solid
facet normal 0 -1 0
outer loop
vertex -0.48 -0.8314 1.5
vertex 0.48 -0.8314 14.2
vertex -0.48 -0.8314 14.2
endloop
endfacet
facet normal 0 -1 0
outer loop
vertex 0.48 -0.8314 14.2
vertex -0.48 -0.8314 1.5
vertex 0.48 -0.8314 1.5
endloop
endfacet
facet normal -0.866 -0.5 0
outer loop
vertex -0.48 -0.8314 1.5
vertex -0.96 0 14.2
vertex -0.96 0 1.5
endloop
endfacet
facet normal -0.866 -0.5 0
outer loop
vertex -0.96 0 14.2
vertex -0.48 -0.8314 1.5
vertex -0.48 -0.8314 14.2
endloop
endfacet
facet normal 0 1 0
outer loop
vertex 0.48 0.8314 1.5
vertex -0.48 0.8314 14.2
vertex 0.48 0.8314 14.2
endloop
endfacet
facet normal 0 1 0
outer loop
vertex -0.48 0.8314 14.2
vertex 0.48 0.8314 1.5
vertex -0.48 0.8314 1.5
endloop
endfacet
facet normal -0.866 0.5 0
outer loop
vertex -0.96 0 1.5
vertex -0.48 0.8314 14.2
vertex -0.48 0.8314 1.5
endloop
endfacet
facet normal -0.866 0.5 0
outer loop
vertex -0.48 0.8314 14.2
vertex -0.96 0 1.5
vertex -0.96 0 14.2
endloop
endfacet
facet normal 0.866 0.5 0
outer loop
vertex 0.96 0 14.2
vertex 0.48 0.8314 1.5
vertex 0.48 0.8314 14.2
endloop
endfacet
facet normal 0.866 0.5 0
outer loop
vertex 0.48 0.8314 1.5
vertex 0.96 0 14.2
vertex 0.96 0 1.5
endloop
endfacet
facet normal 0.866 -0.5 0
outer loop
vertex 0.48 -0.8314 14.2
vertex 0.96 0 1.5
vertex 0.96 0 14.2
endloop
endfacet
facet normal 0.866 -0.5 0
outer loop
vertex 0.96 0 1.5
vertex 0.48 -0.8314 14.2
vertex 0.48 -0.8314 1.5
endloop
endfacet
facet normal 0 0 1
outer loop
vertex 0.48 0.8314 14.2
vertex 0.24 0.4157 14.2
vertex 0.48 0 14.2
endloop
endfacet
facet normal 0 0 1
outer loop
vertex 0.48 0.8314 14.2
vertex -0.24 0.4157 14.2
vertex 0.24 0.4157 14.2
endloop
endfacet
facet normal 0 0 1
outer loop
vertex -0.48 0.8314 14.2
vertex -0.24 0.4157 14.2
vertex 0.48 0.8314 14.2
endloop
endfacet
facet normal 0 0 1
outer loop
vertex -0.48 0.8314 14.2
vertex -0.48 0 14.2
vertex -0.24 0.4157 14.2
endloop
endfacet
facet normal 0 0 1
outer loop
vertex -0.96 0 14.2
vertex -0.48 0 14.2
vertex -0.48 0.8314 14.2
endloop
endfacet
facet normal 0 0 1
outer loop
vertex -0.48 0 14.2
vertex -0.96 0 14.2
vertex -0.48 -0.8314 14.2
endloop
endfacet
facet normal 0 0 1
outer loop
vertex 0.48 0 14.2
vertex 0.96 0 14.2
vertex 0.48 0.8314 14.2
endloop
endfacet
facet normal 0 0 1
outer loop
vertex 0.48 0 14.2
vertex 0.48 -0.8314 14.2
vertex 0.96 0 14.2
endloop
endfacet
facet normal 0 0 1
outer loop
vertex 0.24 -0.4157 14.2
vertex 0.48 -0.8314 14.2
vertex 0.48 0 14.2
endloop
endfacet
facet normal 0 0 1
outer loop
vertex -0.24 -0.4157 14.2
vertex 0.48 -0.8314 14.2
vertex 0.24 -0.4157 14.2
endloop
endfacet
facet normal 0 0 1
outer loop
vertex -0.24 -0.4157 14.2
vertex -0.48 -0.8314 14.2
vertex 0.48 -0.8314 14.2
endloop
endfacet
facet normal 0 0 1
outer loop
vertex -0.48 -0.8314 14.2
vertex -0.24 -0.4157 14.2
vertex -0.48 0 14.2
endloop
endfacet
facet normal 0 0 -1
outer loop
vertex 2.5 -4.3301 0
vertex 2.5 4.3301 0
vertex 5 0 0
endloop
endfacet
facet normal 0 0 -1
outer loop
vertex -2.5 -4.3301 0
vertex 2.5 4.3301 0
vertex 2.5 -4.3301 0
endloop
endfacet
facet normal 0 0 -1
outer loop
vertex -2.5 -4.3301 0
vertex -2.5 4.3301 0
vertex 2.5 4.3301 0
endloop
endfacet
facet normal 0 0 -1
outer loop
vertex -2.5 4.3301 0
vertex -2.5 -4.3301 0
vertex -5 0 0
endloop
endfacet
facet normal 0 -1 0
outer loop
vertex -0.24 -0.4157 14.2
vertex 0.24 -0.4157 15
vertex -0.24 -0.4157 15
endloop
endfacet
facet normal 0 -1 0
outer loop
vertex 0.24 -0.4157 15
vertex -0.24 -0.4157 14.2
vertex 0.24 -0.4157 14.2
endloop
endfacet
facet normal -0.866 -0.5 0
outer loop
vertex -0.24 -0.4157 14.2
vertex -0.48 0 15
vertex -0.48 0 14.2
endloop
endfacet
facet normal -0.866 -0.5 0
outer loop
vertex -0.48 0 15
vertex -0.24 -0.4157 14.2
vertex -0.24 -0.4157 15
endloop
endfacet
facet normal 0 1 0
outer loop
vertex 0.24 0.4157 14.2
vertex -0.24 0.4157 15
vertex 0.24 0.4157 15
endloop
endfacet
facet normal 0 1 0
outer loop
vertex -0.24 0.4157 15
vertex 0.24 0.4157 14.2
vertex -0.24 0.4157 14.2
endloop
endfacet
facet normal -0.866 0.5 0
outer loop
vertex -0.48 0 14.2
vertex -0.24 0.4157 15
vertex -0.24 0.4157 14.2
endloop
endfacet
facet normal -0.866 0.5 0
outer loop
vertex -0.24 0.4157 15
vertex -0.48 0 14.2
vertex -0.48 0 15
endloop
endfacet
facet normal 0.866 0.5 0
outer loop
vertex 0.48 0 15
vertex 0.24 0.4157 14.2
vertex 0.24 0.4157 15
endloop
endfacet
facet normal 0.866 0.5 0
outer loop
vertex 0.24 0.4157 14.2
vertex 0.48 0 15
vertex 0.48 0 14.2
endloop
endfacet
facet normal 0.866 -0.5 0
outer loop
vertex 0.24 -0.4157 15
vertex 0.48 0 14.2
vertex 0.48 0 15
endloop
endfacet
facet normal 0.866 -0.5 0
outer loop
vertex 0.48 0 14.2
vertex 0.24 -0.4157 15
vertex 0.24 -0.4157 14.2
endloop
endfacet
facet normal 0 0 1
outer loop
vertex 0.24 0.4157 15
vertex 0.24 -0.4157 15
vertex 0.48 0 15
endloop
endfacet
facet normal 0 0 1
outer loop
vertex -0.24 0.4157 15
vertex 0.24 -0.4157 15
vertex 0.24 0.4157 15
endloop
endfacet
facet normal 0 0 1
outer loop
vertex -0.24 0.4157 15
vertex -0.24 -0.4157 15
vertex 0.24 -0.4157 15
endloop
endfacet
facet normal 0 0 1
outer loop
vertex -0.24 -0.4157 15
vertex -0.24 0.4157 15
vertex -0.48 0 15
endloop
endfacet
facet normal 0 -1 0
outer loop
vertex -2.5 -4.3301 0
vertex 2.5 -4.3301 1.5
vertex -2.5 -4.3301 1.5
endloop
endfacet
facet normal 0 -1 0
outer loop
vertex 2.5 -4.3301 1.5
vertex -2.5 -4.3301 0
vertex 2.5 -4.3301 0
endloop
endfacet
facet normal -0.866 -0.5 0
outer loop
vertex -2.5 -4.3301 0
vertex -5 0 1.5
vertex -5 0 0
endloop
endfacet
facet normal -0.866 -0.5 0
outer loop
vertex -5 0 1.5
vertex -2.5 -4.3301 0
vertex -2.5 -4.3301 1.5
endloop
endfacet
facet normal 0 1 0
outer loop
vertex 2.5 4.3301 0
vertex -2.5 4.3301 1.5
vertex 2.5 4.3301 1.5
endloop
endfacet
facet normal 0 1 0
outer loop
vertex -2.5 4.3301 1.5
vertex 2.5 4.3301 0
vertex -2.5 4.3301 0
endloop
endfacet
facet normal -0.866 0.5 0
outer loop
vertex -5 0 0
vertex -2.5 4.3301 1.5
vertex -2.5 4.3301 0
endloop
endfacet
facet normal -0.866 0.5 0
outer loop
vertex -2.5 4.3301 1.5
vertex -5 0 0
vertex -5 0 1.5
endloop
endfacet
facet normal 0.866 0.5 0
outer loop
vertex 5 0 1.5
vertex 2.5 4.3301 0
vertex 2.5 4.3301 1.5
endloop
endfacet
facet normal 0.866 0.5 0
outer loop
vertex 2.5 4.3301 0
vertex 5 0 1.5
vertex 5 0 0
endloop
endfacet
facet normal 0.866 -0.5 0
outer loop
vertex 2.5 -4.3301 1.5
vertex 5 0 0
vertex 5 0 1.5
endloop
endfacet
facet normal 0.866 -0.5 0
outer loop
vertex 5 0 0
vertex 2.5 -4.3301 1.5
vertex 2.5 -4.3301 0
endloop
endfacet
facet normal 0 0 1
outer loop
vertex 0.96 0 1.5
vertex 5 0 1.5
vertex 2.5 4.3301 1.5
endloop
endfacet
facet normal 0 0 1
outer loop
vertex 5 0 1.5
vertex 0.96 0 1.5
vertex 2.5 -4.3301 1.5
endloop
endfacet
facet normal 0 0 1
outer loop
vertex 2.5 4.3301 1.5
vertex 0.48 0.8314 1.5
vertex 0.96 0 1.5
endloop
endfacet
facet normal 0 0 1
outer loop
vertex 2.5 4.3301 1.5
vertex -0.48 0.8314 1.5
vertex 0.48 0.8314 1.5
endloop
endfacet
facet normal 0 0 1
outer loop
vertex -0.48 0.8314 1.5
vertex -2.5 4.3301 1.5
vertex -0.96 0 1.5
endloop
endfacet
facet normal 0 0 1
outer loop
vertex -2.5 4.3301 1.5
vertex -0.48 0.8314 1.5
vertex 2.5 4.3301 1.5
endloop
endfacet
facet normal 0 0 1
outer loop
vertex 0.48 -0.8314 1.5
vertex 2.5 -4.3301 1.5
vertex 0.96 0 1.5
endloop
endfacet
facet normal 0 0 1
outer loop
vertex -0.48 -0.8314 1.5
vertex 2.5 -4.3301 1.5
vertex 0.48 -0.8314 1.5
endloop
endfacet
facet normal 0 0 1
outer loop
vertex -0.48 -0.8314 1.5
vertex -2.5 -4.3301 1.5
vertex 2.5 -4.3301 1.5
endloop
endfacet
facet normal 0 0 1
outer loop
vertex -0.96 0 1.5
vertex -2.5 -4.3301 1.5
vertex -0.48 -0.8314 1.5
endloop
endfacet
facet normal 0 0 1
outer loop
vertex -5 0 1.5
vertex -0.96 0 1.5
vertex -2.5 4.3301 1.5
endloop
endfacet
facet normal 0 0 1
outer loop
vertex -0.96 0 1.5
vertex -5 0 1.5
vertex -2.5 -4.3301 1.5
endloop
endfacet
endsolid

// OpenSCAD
// file: ../cookie_cutter.scad
// Cookie cutter generator
// Pau Fernández <pauek@minidosis.org>
// GNU GPL v2

module dxf(file, layer, height) {
   orig = dxf_cross(file = file, layer = layer);
   echo("origin: ", orig);
   translate([-orig[0], -orig[1], 0])
      linear_extrude(height = height)
         import(file = file, layer = layer);
}

module needle(height, thin1, thin2) {
   union() {
      cylinder(r = thin1, h = height-0.8, $fn = 6);
      cylinder(r = thin2, h = height, $fn = 6);
   }
}

module wall(file, layer, height, thin) {
   difference() {
      minkowski() {
        dxf(file, layer, 0.01);
        cylinder(r = thin, h = height, $fn = 6);
      }
      translate([0, 0, -1]) dxf(file, layer, height + 2);
   }
}

module cutter(file, layer, height, nozzle_diameter) {
   thin1 = nozzle_diameter * 2.4;
   thin2 = nozzle_diameter * 1.2;
   difference() {
      minkowski() {
        dxf(file, layer, 0.01);
        needle(height, thin1, thin2);
      }
      translate([0, 0, -1]) dxf(file, layer, height + 2);
   }
}

module cookie_cutter(file, height, join_height, nozzle_diameter) {
   union () {
      cutter(file, "cutter", height, nozzle_diameter);
      wall(file, "outer", 1, 5);
   }
}

module cookie_cutter_join(file, height, nozzle_diameter) {
   mirror([1, 0, 0]) union () {
      cutter(file, "cutter", height, nozzle_diameter);
      wall(file, "outer", 1.5, 5);
      dxf(file, "join", 1.5);
   }
}
// main file
include <../cookie_cutter.scad>;
cookie_cutter_join("C.dxf", 15, 0.4);
